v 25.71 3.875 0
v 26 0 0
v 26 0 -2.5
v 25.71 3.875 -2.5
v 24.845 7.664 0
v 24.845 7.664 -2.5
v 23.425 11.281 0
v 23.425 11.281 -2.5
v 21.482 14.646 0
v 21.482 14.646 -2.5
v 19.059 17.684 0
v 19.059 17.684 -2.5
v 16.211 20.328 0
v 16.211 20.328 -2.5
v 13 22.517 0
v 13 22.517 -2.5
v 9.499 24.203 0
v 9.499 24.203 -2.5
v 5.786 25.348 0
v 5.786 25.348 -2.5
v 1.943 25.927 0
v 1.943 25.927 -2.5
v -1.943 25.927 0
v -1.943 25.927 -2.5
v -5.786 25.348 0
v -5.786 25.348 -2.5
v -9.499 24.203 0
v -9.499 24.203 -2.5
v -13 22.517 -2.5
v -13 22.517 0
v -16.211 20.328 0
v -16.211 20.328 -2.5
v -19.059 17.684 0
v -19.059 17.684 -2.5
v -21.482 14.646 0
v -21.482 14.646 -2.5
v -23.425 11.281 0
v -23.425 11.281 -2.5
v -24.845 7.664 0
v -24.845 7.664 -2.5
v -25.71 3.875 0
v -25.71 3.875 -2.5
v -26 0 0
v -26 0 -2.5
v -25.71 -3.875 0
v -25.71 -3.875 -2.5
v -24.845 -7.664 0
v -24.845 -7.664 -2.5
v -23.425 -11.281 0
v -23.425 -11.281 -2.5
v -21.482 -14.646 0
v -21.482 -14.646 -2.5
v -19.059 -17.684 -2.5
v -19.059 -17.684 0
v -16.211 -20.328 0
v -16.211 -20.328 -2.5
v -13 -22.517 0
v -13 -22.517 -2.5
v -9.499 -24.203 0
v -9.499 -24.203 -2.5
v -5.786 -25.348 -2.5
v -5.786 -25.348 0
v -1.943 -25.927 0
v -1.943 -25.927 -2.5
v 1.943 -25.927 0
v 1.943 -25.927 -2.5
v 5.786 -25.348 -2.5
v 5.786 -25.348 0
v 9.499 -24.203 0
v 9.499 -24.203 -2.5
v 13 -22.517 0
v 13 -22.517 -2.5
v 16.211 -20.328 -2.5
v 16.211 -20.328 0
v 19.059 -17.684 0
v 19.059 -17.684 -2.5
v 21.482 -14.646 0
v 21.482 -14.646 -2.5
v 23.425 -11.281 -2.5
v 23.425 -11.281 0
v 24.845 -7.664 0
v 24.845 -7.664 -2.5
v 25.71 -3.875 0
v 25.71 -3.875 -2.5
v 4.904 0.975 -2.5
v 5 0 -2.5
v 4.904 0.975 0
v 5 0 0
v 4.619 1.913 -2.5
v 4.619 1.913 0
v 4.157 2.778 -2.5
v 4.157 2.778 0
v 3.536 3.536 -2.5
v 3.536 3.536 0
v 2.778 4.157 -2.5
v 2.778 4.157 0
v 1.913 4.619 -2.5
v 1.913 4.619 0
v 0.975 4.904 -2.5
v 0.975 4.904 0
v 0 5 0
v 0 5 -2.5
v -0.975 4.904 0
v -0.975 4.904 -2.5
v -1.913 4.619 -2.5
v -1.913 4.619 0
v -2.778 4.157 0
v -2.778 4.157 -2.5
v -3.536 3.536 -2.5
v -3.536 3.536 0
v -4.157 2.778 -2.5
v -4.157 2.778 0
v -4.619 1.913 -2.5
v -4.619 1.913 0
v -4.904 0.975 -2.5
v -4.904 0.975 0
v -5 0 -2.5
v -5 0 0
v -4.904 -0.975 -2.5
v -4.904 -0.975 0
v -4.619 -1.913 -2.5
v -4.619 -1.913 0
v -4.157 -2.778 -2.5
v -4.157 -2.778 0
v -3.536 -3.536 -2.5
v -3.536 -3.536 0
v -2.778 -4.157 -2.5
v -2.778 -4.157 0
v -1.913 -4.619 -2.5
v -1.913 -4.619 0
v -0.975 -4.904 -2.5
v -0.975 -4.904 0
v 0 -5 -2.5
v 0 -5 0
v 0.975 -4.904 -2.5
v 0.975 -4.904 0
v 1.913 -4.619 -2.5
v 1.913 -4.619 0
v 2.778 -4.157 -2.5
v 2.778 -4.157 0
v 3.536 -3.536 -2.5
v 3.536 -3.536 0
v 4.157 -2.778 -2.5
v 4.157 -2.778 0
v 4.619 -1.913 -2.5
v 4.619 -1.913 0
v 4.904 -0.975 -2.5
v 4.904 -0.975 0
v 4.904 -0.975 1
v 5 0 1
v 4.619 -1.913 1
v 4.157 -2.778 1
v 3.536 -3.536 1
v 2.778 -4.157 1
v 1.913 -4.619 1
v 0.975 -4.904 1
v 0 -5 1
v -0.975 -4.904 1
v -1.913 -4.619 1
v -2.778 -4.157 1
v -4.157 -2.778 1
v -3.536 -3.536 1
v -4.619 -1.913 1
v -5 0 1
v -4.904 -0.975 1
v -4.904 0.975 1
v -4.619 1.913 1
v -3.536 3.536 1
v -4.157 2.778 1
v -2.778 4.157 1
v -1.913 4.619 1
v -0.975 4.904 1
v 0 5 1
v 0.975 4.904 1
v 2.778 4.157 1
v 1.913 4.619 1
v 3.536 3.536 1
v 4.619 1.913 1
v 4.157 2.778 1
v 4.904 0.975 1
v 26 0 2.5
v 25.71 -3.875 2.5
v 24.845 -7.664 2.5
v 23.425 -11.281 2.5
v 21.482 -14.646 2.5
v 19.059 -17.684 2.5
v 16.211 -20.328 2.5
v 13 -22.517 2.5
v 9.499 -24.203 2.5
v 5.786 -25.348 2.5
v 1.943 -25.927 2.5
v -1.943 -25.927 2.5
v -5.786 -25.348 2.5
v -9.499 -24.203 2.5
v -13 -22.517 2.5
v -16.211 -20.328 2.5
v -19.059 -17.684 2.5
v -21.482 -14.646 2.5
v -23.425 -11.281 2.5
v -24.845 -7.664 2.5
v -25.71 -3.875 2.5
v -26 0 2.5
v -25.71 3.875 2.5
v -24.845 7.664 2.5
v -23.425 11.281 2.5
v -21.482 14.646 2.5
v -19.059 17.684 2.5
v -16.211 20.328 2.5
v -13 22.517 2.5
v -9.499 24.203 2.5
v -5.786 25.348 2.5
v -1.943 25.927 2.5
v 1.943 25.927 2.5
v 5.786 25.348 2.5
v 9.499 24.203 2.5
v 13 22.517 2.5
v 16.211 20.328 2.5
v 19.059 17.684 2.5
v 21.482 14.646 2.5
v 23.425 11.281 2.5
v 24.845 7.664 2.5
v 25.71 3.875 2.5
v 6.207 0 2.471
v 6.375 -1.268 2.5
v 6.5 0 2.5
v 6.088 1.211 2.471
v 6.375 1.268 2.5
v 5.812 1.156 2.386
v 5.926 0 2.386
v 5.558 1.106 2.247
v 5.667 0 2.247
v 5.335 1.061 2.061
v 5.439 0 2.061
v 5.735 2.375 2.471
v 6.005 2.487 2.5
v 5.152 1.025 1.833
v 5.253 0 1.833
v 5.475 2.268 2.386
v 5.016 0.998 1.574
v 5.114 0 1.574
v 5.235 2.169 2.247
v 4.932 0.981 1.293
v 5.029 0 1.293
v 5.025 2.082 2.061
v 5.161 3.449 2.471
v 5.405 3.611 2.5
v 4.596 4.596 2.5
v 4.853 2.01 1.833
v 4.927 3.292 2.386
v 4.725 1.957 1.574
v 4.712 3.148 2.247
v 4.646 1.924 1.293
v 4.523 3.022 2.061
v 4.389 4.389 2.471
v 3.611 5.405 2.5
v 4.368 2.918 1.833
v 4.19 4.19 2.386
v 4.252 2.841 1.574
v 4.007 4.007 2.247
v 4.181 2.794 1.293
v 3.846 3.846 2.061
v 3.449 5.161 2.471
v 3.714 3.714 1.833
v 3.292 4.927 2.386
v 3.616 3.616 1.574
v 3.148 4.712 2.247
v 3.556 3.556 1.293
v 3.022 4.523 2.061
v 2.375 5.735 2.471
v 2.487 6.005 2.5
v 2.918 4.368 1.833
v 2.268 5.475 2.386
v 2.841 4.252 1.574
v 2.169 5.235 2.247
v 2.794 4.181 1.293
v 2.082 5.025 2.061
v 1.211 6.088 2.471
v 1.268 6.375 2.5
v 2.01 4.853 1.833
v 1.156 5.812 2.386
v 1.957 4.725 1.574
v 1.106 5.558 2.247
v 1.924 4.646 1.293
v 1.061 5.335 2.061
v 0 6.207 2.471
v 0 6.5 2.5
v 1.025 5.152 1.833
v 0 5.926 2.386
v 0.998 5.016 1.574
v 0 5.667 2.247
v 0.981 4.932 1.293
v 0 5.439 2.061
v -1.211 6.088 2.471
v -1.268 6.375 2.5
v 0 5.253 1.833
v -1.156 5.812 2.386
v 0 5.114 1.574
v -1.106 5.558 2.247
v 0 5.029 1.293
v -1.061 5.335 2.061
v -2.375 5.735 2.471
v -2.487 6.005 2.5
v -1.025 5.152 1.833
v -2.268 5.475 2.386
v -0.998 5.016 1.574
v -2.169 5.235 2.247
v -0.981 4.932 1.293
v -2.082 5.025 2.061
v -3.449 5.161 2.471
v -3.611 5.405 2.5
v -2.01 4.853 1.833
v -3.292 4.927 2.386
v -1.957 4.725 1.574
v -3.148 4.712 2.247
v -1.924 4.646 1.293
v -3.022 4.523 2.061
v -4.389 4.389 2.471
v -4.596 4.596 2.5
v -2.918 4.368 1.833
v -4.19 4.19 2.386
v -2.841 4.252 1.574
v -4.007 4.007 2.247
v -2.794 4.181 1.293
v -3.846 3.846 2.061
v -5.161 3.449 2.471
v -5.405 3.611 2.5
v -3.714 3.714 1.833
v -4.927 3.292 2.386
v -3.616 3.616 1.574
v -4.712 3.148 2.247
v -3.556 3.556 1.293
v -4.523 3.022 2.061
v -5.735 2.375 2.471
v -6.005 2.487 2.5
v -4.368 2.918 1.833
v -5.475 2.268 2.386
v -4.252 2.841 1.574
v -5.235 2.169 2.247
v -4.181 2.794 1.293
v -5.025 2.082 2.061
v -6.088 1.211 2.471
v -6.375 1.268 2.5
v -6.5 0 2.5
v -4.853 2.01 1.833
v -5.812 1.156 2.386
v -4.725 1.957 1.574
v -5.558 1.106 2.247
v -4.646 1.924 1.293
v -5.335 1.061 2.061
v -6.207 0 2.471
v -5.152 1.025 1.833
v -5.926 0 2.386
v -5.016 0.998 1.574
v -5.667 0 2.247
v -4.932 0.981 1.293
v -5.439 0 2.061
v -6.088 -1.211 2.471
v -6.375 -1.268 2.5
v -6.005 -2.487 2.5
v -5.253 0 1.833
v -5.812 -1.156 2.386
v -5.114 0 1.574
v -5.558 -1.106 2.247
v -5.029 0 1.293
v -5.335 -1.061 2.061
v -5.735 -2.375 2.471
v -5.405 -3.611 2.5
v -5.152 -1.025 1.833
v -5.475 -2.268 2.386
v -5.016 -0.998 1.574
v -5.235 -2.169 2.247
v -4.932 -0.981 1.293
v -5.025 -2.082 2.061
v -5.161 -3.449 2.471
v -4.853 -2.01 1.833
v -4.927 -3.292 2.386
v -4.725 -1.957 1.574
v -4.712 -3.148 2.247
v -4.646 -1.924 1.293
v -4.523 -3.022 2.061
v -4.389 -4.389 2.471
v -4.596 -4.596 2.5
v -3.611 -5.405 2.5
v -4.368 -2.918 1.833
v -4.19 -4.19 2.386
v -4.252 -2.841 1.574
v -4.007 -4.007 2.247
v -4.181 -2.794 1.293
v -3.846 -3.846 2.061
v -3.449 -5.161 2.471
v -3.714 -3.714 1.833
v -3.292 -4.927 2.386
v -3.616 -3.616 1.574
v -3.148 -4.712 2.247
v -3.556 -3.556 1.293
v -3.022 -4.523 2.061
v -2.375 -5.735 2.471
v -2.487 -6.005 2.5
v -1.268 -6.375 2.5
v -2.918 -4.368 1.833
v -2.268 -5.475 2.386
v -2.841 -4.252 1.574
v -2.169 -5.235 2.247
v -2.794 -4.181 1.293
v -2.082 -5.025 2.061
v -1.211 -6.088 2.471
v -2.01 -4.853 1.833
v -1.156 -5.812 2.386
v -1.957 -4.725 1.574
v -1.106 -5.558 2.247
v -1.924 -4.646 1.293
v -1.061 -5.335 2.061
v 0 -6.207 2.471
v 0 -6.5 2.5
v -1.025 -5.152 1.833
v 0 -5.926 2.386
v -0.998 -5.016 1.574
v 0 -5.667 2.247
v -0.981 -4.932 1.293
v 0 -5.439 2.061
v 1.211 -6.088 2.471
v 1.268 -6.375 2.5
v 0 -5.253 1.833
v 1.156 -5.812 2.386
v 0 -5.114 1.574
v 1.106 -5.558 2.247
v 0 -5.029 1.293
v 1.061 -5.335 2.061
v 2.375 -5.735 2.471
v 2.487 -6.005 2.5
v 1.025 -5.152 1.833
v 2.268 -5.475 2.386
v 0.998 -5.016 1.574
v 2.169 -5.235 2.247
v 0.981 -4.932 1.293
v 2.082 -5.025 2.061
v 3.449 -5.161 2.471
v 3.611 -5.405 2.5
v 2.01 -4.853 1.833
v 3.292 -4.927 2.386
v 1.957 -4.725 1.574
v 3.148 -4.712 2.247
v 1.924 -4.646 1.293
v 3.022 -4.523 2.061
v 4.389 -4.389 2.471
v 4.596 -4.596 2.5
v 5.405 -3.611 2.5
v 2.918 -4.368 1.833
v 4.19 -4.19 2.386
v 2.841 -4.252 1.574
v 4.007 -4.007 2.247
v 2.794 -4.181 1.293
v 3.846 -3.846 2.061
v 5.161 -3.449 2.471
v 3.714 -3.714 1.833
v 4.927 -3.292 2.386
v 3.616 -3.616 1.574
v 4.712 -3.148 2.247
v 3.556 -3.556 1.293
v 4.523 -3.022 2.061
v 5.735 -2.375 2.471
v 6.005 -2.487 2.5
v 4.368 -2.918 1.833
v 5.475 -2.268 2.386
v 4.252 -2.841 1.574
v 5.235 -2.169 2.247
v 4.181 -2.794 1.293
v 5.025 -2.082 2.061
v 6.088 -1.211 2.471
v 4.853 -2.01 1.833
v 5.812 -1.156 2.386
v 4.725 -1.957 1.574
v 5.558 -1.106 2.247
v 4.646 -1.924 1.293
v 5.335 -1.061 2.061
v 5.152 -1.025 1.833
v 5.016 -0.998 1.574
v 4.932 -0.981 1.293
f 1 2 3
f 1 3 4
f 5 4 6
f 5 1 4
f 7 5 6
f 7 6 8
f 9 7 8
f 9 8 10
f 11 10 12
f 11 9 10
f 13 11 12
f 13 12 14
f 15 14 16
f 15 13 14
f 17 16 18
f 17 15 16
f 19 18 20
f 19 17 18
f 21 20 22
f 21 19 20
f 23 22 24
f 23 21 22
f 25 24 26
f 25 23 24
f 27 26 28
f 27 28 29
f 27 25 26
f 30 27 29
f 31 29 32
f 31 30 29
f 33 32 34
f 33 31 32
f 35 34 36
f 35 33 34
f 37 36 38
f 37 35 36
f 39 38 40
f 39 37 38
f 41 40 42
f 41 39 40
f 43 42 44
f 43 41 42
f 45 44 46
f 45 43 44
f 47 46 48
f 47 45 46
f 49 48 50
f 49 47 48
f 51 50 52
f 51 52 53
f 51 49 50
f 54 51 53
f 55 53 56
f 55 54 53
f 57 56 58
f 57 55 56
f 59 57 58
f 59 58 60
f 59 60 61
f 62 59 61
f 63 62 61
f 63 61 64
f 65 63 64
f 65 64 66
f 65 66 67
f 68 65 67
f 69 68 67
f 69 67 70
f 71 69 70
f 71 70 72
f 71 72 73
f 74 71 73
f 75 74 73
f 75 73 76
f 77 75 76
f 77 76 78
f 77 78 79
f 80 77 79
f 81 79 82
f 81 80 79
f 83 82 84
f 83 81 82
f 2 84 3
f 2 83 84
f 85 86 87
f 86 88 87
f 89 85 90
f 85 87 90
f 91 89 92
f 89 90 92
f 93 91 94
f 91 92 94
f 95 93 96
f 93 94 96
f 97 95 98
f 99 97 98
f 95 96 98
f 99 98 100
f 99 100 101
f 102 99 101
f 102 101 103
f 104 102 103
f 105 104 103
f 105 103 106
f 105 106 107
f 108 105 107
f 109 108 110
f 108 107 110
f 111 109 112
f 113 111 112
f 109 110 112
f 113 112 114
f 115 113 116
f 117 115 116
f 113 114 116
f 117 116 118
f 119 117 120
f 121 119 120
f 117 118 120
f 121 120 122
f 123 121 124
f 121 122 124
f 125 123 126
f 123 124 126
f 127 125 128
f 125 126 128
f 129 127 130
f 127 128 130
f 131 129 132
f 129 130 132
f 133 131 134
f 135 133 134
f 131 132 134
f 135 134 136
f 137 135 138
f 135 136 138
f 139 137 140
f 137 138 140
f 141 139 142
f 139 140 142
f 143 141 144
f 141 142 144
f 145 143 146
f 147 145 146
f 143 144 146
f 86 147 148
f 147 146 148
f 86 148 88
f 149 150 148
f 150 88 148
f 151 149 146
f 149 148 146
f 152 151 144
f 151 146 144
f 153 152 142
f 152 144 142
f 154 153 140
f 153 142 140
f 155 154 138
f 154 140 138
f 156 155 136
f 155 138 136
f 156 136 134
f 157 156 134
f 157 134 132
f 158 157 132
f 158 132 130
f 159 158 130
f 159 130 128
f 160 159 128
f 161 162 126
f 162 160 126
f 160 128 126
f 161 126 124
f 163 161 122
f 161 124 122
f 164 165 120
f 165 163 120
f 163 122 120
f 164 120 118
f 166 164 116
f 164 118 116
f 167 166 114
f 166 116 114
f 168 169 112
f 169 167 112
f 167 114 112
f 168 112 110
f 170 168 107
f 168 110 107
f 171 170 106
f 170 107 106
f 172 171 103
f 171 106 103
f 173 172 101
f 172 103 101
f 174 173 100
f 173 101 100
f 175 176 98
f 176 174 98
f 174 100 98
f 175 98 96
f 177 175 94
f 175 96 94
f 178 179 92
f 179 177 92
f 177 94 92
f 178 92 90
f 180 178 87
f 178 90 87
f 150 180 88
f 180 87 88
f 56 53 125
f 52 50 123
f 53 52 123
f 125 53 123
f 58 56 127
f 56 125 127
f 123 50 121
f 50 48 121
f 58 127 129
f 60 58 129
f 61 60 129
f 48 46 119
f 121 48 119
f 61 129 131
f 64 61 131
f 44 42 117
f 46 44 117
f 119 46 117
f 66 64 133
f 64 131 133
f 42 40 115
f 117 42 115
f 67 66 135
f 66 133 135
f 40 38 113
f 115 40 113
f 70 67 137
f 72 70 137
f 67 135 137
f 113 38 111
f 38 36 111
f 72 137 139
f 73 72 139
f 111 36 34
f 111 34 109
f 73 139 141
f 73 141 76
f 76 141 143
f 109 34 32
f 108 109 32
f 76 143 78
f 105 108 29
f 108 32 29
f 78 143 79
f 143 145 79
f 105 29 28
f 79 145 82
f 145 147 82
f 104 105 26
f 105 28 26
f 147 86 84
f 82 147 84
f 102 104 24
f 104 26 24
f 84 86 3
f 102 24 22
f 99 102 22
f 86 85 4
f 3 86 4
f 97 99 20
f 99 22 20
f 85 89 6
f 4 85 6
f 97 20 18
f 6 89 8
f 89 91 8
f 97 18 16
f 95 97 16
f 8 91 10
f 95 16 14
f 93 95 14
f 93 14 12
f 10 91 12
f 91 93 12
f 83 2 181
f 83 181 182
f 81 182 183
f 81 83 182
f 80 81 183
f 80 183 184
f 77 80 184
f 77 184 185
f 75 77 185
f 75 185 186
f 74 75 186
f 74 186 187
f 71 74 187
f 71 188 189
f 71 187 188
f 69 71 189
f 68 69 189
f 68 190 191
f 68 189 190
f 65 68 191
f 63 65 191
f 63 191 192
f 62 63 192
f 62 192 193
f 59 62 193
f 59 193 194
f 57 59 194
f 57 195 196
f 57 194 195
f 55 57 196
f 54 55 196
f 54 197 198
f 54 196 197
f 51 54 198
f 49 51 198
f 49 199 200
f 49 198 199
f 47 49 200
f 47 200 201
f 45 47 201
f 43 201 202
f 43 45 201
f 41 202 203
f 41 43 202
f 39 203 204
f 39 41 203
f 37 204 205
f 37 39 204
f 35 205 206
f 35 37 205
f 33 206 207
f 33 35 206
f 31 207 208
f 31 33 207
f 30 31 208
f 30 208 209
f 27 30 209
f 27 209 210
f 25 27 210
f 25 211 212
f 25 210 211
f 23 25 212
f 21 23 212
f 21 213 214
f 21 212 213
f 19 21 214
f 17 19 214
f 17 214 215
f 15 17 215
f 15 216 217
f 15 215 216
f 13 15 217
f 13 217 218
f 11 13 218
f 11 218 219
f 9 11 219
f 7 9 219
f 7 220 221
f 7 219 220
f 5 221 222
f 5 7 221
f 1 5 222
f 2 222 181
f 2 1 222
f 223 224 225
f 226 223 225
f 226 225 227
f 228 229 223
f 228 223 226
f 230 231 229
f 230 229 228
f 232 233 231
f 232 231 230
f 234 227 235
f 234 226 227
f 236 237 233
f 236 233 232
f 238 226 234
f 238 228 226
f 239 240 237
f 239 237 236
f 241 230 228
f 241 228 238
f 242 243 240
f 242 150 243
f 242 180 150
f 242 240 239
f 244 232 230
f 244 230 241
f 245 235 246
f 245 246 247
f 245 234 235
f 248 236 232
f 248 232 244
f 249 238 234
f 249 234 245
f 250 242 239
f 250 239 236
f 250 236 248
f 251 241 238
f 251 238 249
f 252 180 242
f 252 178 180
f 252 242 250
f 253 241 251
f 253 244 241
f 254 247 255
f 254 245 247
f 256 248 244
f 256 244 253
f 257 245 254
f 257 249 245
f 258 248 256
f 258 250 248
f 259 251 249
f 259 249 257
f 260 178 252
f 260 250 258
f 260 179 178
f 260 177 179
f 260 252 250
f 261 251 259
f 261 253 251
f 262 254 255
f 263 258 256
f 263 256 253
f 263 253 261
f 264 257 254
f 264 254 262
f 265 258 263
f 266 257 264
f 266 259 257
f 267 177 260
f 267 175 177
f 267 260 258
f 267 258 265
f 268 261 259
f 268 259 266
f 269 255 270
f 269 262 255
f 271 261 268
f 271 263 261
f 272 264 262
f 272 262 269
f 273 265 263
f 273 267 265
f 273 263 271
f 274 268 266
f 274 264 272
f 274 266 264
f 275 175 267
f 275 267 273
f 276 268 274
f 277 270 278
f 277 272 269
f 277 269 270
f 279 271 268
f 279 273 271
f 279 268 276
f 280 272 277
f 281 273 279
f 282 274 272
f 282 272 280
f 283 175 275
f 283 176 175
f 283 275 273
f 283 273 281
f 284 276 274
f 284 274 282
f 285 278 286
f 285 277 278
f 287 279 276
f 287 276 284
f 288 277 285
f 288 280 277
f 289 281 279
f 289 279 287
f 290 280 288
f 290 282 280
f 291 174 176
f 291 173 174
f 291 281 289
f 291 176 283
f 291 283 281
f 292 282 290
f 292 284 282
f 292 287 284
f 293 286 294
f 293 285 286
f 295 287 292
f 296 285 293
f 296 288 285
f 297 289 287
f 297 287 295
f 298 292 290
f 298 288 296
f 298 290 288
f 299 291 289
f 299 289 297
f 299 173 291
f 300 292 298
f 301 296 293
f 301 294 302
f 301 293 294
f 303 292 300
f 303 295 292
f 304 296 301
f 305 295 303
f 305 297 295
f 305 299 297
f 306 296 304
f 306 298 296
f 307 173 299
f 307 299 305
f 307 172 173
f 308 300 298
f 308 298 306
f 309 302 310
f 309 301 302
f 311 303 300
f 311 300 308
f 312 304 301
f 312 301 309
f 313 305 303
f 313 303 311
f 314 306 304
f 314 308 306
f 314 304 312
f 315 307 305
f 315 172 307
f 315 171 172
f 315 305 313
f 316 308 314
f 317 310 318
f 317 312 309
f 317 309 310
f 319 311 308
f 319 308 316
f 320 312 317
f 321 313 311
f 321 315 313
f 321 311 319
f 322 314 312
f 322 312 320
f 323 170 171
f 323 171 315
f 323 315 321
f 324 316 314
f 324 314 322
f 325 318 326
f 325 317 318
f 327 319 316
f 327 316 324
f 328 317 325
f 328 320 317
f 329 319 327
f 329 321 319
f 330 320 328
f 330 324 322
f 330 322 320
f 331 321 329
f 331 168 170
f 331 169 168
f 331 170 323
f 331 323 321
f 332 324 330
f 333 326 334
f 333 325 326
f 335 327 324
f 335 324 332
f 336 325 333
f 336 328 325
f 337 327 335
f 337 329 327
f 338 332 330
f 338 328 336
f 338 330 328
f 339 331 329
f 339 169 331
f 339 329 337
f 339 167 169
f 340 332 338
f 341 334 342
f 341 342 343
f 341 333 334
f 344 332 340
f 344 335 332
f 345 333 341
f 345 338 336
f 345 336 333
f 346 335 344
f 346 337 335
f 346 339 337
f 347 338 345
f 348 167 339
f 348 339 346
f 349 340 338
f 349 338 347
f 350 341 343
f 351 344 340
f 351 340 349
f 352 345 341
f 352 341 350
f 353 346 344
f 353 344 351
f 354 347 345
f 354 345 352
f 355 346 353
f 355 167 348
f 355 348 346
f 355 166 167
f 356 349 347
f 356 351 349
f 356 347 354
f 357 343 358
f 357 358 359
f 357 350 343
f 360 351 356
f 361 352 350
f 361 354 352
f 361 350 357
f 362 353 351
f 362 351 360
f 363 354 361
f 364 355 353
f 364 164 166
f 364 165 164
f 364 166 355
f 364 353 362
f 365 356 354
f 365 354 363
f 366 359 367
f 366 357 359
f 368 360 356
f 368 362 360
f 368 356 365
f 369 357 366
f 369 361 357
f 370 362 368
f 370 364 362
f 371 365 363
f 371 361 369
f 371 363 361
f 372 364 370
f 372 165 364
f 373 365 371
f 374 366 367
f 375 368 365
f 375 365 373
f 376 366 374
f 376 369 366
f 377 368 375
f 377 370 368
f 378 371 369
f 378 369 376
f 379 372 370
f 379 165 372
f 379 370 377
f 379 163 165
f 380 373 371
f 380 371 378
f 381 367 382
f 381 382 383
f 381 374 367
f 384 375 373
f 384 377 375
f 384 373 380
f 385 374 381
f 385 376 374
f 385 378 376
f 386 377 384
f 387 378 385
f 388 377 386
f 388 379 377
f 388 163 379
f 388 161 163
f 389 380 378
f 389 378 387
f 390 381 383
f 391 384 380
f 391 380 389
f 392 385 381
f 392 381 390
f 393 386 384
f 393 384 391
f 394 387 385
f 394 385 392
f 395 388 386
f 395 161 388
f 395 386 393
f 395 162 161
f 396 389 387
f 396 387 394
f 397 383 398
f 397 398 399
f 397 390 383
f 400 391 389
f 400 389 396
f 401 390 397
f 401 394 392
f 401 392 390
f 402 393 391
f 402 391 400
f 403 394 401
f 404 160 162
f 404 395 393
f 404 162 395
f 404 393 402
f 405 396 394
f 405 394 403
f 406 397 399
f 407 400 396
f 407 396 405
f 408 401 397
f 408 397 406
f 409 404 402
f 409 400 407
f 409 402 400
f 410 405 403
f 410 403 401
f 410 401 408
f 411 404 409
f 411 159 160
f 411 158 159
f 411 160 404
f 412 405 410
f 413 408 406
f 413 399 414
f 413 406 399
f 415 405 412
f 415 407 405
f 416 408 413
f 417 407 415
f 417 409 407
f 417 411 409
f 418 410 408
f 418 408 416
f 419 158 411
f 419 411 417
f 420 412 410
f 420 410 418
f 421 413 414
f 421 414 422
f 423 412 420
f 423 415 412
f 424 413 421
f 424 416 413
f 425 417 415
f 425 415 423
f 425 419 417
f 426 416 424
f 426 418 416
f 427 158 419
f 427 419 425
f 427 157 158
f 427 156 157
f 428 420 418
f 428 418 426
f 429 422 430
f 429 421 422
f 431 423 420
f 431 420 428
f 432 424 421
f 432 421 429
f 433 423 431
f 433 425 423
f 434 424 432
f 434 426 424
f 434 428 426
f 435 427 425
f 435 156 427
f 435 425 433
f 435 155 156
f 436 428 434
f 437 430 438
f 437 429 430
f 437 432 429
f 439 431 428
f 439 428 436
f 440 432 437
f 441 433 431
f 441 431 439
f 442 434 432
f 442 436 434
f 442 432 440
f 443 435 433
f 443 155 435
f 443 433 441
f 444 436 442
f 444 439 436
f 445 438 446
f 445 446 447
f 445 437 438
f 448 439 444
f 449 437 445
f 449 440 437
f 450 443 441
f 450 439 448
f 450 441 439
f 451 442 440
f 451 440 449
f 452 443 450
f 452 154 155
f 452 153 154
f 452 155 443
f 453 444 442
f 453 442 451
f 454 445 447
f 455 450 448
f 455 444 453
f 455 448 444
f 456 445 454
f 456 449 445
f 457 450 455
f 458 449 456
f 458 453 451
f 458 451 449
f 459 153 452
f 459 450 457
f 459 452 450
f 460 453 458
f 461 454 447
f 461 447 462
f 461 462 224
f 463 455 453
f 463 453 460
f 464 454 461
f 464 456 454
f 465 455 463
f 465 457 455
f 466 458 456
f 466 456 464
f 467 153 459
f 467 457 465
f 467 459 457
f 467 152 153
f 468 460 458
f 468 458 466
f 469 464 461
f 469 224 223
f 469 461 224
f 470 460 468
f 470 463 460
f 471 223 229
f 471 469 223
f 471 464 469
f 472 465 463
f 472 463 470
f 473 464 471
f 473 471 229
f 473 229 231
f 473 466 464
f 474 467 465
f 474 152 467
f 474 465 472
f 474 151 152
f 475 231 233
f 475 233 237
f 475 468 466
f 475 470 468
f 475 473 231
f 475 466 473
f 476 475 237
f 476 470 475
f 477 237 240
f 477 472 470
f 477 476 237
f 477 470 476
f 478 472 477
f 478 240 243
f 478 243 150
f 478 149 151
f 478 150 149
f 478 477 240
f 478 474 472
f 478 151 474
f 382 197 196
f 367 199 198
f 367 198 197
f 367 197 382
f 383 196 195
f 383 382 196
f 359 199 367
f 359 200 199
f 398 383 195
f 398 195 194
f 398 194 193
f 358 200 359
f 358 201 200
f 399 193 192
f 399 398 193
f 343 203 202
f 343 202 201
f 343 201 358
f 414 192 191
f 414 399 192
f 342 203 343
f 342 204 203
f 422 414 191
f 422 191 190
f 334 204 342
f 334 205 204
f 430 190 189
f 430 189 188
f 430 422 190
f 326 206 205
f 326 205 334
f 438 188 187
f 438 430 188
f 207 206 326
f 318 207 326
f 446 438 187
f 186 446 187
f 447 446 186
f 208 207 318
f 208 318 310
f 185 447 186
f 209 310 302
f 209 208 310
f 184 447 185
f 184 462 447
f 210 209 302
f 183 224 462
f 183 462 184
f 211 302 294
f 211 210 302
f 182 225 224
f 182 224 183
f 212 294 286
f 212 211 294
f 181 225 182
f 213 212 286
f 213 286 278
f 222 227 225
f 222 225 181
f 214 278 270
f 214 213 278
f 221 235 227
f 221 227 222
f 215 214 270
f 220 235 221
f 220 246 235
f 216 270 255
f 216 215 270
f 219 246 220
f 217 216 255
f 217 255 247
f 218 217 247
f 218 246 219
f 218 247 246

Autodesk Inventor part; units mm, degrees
ref_plane "YZ Plane" through (0, 0, 0) normal (1, 0, 0) x (0, 1, 0)
ref_plane "XZ Plane" through (0, 0, 0) normal (0, 1, 0) x (-1, 0, 0)
ref_plane "XY Plane" through (0, 0, 0) normal (0, 0, 1) x (1, 0, 0)
sketch "Sketch1" plane through (0, 0, 0) normal (0, 0, 1) x (1, 0, 0)
  circle A0 centre (0, 0) radius 26
  circle A1 centre (0, 0) radius 5
  dimension "d0" = 52
  dimension "d1" = 10
extrude "Extrusion1" add sketch "Sketch1" along normal mid plane 5
fillet "Fillet1" radius 1.5 1 edges at (-5, 0, 2.5)
properties part number "Rubber"
